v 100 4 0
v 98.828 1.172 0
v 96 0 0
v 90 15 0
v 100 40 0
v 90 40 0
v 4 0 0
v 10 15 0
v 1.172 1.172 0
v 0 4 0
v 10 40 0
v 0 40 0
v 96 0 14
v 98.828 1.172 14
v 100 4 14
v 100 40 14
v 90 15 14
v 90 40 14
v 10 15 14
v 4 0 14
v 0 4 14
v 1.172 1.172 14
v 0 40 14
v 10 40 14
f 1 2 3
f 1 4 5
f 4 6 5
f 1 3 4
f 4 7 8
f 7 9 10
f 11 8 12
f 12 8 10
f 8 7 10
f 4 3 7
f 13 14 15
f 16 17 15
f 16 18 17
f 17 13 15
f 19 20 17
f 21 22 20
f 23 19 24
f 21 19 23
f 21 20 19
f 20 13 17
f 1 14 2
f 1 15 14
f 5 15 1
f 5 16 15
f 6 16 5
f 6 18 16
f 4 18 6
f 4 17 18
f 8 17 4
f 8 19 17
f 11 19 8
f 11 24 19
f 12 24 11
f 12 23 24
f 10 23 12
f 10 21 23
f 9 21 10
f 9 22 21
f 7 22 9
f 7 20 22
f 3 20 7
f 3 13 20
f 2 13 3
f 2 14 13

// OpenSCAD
$fn = 32;

// ----------------------------------------------------------------------
// Heat sink frame: 100 x 40 mm frame, 10 mm walls
// ----------------------------------------------------------------------

// --- parameters (mm) ---
profile_height = 14;      // extrusion height
profile_points = 12;      // points of the closed outline

profile = [[0, 4], [1.172, 1.172], [4, 0], [96, 0], [98.828, 1.172], [100, 4], [100, 40], [90, 40], [90, 15], [10, 15], [10, 40], [0, 40]];  // single closed polygon, 12 points, counter clockwise

// --- the one profile operation ---
linear_extrude(height = profile_height) polygon(points = profile);
